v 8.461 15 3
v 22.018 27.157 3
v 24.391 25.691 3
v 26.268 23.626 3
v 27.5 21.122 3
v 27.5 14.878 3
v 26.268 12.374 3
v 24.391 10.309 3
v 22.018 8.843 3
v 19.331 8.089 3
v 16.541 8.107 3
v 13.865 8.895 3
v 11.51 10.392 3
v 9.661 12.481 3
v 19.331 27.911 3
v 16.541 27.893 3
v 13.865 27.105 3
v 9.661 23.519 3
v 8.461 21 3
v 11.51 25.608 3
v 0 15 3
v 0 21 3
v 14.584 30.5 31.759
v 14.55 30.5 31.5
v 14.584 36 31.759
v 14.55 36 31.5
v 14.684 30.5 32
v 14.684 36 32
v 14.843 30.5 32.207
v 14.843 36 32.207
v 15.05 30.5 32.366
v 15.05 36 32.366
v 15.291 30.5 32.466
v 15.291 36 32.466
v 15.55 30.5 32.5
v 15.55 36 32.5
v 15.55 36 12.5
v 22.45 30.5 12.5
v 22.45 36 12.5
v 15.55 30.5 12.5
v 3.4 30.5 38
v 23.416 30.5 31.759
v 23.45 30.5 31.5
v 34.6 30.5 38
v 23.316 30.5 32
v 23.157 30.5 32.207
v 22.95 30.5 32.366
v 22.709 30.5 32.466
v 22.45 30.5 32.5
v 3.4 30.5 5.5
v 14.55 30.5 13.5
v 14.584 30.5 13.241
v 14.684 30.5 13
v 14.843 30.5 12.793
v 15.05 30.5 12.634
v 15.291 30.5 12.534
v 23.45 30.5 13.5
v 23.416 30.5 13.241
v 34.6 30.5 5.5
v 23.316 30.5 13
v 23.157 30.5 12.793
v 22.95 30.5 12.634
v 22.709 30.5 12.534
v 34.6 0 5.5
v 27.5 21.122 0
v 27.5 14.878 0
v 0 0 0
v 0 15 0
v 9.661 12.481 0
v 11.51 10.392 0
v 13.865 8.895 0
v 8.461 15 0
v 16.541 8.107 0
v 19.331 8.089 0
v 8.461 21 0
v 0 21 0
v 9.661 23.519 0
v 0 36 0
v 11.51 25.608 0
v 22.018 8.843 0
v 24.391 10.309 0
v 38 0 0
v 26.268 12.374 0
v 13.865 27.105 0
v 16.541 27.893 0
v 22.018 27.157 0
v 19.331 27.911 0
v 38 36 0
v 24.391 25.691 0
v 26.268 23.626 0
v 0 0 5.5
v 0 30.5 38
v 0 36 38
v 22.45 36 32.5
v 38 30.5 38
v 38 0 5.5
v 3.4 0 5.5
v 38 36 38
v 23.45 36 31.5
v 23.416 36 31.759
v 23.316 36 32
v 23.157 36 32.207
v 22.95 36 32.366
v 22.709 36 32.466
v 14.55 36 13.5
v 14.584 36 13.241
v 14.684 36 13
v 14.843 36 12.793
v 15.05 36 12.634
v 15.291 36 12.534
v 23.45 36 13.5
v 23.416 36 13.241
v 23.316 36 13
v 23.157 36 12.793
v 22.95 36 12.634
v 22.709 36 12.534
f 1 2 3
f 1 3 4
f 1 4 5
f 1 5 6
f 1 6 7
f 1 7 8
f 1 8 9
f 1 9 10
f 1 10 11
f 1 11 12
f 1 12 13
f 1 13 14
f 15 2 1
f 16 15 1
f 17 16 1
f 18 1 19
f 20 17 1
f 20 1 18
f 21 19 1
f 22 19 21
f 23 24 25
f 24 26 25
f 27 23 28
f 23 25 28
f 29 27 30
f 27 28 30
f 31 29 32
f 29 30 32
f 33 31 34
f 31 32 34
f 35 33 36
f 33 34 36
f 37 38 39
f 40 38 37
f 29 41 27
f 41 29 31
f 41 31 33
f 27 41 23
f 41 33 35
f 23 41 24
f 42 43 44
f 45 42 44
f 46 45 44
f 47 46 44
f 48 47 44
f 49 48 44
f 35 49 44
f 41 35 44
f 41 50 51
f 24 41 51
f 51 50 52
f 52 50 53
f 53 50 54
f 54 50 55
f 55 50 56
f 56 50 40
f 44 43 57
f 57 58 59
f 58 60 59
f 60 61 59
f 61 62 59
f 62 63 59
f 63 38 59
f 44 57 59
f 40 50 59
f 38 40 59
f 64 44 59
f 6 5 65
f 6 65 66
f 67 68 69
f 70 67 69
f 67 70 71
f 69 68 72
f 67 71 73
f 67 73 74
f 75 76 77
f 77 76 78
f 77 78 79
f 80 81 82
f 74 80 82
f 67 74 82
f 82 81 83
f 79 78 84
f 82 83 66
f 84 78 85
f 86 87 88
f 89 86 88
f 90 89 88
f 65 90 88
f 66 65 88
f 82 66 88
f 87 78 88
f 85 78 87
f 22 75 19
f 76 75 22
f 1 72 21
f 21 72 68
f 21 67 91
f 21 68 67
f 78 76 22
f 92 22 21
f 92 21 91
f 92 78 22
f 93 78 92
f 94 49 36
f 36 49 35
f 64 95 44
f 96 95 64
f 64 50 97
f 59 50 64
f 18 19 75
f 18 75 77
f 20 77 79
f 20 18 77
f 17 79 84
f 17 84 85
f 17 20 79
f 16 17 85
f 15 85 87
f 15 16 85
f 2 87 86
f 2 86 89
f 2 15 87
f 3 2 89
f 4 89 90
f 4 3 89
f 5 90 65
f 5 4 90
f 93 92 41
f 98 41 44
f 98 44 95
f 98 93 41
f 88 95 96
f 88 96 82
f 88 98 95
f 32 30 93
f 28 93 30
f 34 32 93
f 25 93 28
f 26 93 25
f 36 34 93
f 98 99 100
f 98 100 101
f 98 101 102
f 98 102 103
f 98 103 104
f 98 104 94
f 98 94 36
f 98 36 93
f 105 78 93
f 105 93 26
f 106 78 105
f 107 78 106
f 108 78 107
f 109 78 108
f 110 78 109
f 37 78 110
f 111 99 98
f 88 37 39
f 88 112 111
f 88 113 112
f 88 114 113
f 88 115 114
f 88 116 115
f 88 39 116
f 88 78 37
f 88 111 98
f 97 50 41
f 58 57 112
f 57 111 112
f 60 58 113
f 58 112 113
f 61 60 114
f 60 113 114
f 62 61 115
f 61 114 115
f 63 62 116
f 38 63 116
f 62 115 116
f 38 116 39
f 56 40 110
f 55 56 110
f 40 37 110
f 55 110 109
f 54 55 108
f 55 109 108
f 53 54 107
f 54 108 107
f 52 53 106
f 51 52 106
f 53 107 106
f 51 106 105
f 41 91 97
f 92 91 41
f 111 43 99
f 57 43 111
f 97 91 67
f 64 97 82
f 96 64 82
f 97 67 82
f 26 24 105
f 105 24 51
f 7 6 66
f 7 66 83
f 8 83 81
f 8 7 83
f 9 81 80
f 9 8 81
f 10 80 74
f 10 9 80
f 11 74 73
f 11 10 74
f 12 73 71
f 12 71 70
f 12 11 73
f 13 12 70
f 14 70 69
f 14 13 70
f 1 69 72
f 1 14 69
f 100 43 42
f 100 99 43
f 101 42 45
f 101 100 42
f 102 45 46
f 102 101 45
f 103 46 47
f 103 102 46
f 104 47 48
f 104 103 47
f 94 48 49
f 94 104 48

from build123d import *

# Parameters (mm, degrees)
SKETCH1_W            = 38
SKETCH1_H            = 36
BOSS_EXTRUDE1_DEPTH  = 5.5
SKETCH5_W            = 38
SKETCH5_H            = 5.5
BOSS_EXTRUDE5_DEPTH  = 32.5
BOSS_EXTRUDE6_DEPTH  = 3.4
BOSS_EXTRUDE7_DEPTH  = 3.4
SKETCH9_W            = 8.9
SKETCH9_H            = 20
CUT_EXTRUDE1_DEPTH   = 62.791989772
FILLET1_R            = 1
SKETCH12_OUTSIDE_W   = 52.936
SKETCH12_OUTSIDE_H   = 50.936
SKETCH12_OUTSIDE_W_2 = 38
SKETCH12_OUTSIDE_H_2 = 36
CUT_EXTRUDE3_DEPTH   = 3
SKETCH19_W           = 8.460607986
SKETCH19_H           = 6
CUT_EXTRUDE4_DEPTH   = 3


with BuildPart() as part:
    # Sketch1 → Boss-Extrude1 (new body)
    with BuildSketch(Plane.XY):
        with Locations((19, 18)):
            Rectangle(SKETCH1_W, SKETCH1_H)
    extrude(amount=BOSS_EXTRUDE1_DEPTH)

    # Sketch5 → Boss-Extrude5 (add)
    with BuildSketch(Plane.XY.offset(5.5)):
        with Locations((19, 33.25)):
            Rectangle(SKETCH5_W, SKETCH5_H)
    extrude(amount=BOSS_EXTRUDE5_DEPTH)

    # Sketch7 → Boss-Extrude6 (add)
    with BuildSketch(Plane.ZY):
        Polygon((5.5, 0), (38, 30.5), (5.5, 30.5), align=None)
    extrude(amount=-BOSS_EXTRUDE6_DEPTH)

    # Sketch8 → Boss-Extrude7 (add)
    with BuildSketch(Plane(origin=(38, 0, 0), x_dir=(0, 0, -1), z_dir=(1, 0, 0))):
        Polygon((-5.5, 0), (-5.5, 30.5), (-38, 30.5), align=None)
    extrude(amount=-BOSS_EXTRUDE7_DEPTH)

    # Sketch9 → Cut-Extrude1 (cut, through all)
    with BuildSketch(Plane(origin=(0, 30.5, 0), x_dir=(-1, 0, 0), z_dir=(0, -1, 0))):
        with Locations((-19, -22.5)):
            Rectangle(SKETCH9_W, SKETCH9_H)
    extrude(amount=-CUT_EXTRUDE1_DEPTH, mode=Mode.SUBTRACT)

    # Fillet1
    fillet1_edges = [part.edges().sort_by_distance(p)[0] for p in [
        (23.45, 33.25, 32.5),
        (14.55, 33.25, 32.5),
        (23.45, 33.25, 12.5),
        (14.55, 33.25, 12.5),
    ]]
    fillet(fillet1_edges, radius=FILLET1_R)

    # Sketch12 outside → Cut-Extrude3 (cut)
    # profile 1 of 2: a face of its own
    with BuildSketch(Plane(origin=(0, 0, 0), x_dir=(-1, 0, 0), z_dir=(0, 0, -1))):
        with Locations((-19, 18)):
            Rectangle(SKETCH12_OUTSIDE_W, SKETCH12_OUTSIDE_H)
        with Locations((-19, 18)):
            Rectangle(SKETCH12_OUTSIDE_W_2, SKETCH12_OUTSIDE_H_2, mode=Mode.SUBTRACT)
    # profile 2 of 2: a face of its own
    with BuildSketch(Plane(origin=(0, 0, 0), x_dir=(-1, 0, 0), z_dir=(0, 0, -1))):
        with BuildLine():
            Line((-27.5, 14.877501001), (-27.5, 21.122498999))
            ThreePointArc((-27.5, 21.122498999), (-8, 18), (-27.5, 14.877501001))
        make_face()
    extrude(amount=-CUT_EXTRUDE3_DEPTH, mode=Mode.SUBTRACT)

    # Sketch19 → Cut-Extrude4 (cut)
    with BuildSketch(Plane(origin=(0, 0, 0), x_dir=(-1, 0, 0), z_dir=(0, 0, -1))):
        with Locations((-4.230303993, 18)):
            Rectangle(SKETCH19_W, SKETCH19_H)
    extrude(amount=-CUT_EXTRUDE4_DEPTH, mode=Mode.SUBTRACT)


solid = part.part
